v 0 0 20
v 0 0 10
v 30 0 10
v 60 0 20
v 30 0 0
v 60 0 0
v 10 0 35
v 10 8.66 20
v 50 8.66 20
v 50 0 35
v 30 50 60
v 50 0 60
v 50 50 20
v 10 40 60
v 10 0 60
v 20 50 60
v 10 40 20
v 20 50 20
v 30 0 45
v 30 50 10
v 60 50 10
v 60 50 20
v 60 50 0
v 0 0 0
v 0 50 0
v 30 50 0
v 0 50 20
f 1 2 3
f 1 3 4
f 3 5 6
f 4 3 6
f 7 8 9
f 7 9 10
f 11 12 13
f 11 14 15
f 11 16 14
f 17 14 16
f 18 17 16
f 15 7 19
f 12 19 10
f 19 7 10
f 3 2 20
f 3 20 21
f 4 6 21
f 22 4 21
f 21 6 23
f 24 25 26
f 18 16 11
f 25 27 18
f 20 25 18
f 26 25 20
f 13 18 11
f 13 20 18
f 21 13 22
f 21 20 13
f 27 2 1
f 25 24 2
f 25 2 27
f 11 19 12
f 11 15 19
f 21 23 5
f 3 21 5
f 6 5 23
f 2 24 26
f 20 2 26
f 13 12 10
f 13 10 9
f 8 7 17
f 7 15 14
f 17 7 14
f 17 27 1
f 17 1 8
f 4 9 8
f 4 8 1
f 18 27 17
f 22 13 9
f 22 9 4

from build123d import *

# Parameters (mm, degrees)
F0_W      = 60
F0_H      = 50
F1_DEPTH  = 60
F2_W      = 10
F2_H      = 50
F3_DEPTH  = 40
F5_DEPTH  = 40
F6_W      = 10
F6_H      = 50
F7_DEPTH  = 40
F14_DEPTH = 10
F16_DEPTH = 50.001
F20_DEPTH = 25


with BuildPart() as f1:
    # F0 (on Top) → F1 (new body)
    with BuildSketch(Plane.XY):
        with Locations((30, 25)):
            Rectangle(F0_W, F0_H)
    extrude(amount=F1_DEPTH)

    # F2 (on face) → F3 (cut)
    with BuildSketch(Plane.XY.offset(60)):
        with Locations((5, 25)):
            Rectangle(F2_W, F2_H)
    extrude(amount=-F3_DEPTH, mode=Mode.SUBTRACT)

    # F4 (on face) → F5 (cut)
    with BuildSketch(Plane.XY.offset(60)):
        Polygon((20, 50), (10, 50), (10, 40), align=None)
    extrude(amount=-F5_DEPTH, mode=Mode.SUBTRACT)

    # F6 (on face) → F7 (cut)
    with BuildSketch(Plane.XY.offset(60)):
        with Locations((55, 25)):
            Rectangle(F6_W, F6_H)
    extrude(amount=-F7_DEPTH, mode=Mode.SUBTRACT)

    # F12: sweep along a path in F11
    with BuildLine(Plane.YZ.offset(30)) as f12_path:
        Line((0, 45), (50, 60))
    # F9 (on face) → F12 (sweep, cut)
    with BuildSketch(Plane.XZ):
        Polygon((50, 60), (10, 60), (30, 45), align=None)
    sweep(path=f12_path.line, mode=Mode.SUBTRACT)

    # F13 (on face) → F14 (cut)
    with BuildSketch(Plane(origin=(0, 0, 0), x_dir=(1, 0, 0), z_dir=(0, 0, -1))):
        Polygon((30, 0), (0, 0), (30, -50), (60, -50), align=None)
    extrude(amount=-F14_DEPTH, mode=Mode.SUBTRACT)

    # F15 (on face) → F16 (cut, through all)
    with BuildSketch(Plane.YZ.offset(50)):
        Polygon((0, 35), (0, 20), (8.6602540378, 20), align=None)
    extrude(amount=-F16_DEPTH, mode=Mode.SUBTRACT)

    # F19 (on 3pt) → F20 (cut)
    with BuildSketch(Plane(origin=(56.7375886525, 22.695035461, 28.3687943262), x_dir=(-0.3012974309, 0.9415544714, -0.1506487154), z_dir=(0.8421519211, 0.3368607684, 0.4210759605))):
        Polygon((28.9998777205, 40.249223595), (-24.103794469, 31.304951685), (28.9998777205, -4.472135955), align=None)
    extrude(amount=F20_DEPTH, mode=Mode.SUBTRACT)


solid = f1.part
